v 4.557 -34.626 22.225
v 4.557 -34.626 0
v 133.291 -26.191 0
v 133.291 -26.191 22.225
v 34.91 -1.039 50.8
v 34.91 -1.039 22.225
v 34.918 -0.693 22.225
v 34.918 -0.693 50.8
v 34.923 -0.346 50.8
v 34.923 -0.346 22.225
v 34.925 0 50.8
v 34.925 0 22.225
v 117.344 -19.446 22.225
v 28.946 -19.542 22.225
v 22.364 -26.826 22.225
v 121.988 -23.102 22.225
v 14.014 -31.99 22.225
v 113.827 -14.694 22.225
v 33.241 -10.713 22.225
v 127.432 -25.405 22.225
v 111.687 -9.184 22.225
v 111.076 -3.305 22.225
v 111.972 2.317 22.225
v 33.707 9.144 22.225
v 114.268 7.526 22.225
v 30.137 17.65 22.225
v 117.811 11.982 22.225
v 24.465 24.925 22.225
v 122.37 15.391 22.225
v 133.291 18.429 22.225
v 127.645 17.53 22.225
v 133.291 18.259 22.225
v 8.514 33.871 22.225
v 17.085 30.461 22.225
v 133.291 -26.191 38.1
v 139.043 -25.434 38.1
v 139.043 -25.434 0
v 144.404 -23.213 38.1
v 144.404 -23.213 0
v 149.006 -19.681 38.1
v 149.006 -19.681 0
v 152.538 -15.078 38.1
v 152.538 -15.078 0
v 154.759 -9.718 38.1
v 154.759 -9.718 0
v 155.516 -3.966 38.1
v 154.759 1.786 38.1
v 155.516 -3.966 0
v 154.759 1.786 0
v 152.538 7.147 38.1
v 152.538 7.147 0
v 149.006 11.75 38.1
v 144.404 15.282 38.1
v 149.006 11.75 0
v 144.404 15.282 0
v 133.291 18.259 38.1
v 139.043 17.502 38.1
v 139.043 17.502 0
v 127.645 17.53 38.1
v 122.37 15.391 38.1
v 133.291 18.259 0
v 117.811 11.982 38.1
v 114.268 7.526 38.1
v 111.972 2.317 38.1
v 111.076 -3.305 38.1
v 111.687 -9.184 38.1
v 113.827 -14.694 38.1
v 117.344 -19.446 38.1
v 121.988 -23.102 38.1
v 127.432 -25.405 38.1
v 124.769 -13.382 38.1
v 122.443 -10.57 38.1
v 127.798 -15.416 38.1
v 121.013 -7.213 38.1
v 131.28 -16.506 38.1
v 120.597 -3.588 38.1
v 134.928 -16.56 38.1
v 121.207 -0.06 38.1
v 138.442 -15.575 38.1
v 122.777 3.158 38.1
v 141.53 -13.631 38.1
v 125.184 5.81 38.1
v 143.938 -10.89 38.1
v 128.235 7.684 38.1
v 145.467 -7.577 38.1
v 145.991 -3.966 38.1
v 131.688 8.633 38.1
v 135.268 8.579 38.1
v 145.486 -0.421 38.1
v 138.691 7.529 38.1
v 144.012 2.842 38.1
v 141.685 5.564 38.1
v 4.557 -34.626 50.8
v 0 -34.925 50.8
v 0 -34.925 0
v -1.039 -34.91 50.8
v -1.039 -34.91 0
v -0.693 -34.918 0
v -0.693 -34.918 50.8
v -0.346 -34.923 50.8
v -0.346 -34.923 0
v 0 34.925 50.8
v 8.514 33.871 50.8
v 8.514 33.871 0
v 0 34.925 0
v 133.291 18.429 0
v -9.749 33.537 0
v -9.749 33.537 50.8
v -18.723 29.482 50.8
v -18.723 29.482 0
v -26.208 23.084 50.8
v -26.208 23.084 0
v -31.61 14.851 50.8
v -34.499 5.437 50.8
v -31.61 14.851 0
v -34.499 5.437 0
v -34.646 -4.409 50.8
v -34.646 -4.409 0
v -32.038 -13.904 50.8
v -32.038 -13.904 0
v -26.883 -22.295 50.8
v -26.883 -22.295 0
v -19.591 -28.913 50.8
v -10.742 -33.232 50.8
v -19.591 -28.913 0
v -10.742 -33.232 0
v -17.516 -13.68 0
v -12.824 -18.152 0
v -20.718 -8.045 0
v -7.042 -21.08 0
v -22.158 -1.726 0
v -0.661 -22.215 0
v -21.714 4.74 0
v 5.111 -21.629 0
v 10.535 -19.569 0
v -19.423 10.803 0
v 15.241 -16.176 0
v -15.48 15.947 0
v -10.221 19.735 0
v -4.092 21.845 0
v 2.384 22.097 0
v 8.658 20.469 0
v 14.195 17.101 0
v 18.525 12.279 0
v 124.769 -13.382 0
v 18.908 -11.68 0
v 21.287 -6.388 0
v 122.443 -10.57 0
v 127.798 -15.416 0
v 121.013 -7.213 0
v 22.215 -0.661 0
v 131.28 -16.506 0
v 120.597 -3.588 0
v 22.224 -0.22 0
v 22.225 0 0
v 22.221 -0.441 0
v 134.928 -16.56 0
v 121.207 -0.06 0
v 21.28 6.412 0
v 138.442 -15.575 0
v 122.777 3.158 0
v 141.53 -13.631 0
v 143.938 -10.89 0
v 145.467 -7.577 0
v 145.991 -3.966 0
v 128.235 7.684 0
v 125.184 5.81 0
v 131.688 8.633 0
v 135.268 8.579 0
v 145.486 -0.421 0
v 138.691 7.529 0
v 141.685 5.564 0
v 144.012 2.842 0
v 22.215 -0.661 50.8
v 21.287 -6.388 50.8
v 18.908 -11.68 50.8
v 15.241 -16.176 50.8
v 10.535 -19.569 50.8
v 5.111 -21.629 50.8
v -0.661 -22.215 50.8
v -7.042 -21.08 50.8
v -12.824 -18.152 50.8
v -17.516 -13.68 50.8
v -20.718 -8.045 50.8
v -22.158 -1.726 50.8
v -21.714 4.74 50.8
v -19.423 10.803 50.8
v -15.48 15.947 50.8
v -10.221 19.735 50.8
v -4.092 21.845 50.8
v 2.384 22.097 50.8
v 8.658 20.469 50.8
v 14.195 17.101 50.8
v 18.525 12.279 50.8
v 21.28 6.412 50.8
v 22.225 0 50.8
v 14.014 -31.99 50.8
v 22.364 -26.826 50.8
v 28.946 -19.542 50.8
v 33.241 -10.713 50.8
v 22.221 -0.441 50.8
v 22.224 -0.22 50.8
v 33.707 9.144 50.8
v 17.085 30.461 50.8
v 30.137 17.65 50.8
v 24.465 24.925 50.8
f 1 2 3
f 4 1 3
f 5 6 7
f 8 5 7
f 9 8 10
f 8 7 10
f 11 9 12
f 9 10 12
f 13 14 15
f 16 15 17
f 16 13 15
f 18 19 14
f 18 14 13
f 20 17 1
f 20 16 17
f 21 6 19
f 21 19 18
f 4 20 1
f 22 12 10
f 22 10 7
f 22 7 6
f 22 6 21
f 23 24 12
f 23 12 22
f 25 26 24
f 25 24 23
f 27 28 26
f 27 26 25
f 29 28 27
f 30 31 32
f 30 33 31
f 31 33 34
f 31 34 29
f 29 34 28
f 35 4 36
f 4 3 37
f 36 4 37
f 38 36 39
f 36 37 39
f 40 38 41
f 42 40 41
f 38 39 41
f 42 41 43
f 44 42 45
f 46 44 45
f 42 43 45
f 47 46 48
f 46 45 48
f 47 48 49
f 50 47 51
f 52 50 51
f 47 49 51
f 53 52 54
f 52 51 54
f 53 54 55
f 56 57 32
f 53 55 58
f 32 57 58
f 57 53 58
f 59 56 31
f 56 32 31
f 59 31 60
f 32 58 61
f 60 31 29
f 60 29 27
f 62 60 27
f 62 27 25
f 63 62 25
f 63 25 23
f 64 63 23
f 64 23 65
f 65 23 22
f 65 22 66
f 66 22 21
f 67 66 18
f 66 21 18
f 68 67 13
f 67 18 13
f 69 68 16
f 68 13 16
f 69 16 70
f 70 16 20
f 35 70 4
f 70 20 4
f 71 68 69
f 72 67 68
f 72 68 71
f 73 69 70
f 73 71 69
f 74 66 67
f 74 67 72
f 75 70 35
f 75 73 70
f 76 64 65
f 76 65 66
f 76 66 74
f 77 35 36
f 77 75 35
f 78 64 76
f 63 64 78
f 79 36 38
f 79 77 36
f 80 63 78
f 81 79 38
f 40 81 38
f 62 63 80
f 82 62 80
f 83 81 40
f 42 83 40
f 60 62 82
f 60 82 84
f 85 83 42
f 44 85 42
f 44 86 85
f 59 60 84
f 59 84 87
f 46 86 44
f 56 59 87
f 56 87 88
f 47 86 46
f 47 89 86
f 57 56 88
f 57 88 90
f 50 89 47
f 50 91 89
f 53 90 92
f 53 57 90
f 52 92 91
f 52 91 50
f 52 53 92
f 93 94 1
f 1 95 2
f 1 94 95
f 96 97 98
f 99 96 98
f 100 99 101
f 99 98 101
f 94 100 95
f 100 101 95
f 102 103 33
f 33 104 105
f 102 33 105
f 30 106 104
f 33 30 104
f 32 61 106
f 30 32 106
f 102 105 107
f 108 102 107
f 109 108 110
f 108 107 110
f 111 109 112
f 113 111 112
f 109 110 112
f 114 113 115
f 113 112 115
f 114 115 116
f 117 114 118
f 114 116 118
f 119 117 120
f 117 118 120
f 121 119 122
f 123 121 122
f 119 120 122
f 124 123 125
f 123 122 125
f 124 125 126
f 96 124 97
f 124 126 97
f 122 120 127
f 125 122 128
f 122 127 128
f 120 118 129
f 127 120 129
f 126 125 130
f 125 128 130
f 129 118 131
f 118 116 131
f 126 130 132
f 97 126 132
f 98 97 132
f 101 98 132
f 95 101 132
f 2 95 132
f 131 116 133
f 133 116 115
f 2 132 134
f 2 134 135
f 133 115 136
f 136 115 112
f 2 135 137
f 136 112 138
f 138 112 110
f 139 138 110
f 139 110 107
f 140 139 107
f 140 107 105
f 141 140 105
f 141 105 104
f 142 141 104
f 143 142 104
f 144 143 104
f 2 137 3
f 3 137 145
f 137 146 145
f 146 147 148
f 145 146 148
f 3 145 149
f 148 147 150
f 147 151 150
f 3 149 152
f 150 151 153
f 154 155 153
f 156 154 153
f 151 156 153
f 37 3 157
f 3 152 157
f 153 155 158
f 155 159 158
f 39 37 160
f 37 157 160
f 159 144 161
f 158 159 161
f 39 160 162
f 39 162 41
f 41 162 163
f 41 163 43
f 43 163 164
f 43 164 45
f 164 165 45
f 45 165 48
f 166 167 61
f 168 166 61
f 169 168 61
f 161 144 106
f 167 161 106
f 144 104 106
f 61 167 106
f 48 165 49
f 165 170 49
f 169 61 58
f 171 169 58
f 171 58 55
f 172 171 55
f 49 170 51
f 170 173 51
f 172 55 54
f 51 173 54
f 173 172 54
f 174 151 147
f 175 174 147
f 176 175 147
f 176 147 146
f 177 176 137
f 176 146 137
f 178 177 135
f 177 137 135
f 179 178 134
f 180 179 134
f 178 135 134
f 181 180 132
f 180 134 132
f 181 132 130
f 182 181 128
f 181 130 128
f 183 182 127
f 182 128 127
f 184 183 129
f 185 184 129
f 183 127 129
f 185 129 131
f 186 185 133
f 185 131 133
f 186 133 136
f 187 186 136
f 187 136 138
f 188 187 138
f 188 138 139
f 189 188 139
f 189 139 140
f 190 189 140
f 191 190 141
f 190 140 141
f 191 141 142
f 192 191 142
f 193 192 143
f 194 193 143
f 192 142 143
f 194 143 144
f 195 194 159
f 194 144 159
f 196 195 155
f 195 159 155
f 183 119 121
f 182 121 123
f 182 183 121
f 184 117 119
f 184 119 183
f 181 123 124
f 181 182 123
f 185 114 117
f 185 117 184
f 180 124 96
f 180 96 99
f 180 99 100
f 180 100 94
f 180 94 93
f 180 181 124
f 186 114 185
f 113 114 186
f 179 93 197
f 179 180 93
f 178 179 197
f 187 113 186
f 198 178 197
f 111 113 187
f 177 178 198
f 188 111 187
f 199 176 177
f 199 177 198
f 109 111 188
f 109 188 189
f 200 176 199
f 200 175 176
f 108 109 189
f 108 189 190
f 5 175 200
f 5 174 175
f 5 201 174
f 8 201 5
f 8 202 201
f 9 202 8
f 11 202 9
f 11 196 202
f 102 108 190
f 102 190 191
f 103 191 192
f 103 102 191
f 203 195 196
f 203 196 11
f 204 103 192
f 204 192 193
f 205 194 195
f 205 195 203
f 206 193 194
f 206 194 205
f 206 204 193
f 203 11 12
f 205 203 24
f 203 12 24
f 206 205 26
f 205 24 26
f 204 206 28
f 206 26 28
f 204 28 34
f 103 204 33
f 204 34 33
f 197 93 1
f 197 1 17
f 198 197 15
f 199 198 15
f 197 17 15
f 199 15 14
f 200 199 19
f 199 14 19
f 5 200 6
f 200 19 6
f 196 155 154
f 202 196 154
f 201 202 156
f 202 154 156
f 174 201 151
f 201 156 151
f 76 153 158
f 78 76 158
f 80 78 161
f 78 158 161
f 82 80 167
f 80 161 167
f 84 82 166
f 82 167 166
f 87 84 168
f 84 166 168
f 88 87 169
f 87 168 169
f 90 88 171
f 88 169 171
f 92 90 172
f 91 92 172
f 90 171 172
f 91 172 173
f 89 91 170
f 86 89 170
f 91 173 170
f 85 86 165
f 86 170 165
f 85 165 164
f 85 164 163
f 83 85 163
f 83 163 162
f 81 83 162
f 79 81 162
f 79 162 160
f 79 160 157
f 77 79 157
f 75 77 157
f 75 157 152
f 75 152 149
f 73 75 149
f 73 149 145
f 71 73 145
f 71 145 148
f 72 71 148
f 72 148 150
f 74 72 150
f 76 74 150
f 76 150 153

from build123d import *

# Parameters (mm, degrees)
F1_DEPTH = 22.225
F2_DEPTH = 50.8
F3_DEPTH = 38.1


with BuildPart() as f1:
    # F0 (on Top) → F1 (new body)
    with BuildSketch(Plane.XY):
        with BuildLine():
            ThreePointArc((4.5574981074, -34.6263604209), (25.9122606637, -23.4160281067), (34.9095515761, -1.0386692217))
            Line((34.9095515761, -1.0386692217), (22.2151691848, -0.6609713229))
            ThreePointArc((22.2151691848, -0.6609713229), (15.2411194712, -16.1758740804), (-0.6609713229, -22.2151691848))
            Line((-0.6609713229, -22.2151691848), (-1.0386692217, -34.9095515761))
            ThreePointArc((-1.0386692217, -34.9095515761), (-0.5193920499, -34.9211376805), (0, -34.925))
            Line((0, -34.925), (4.5574981074, -34.6263604209))
        make_face()
        with BuildLine():
            ThreePointArc((34.9095515761, -1.0386692217), (34.9211376805, -0.5193920499), (34.925, 0))
            ThreePointArc((34.925, 0), (27.5419497881, 21.4754889786), (8.514312706, 33.871257788))
            Line((8.514312706, 33.871257788), (0, 34.925))
            ThreePointArc((0, 34.925), (-34.9211376805, 0.5193920499), (-1.0386692217, -34.9095515761))
            Line((-1.0386692217, -34.9095515761), (-0.6609713229, -22.2151691848))
            ThreePointArc((-0.6609713229, -22.2151691848), (-15.4799957582, 15.9474247553), (22.225, 0))
            ThreePointArc((22.225, 0), (22.2225421603, -0.3305222136), (22.2151691848, -0.6609713229))
            Line((22.2151691848, -0.6609713229), (34.9095515761, -1.0386692217))
        make_face()
        with BuildLine():
            Line((111.0758459241, -3.3048566146), (34.9095515761, -1.0386692217))
            ThreePointArc((34.9095515761, -1.0386692217), (25.9122606637, -23.4160281067), (4.5574981074, -34.6263604209))
            Line((4.5574981074, -34.6263604209), (133.2910151089, -26.1908279375))
            ThreePointArc((133.2910151089, -26.1908279375), (117.3435903536, -19.4458236957), (111.0758459241, -3.3048566146))
        make_face()
        with BuildLine():
            ThreePointArc((8.514312706, 33.871257788), (27.5419497881, 21.4754889786), (34.925, 0))
            ThreePointArc((34.925, 0), (34.9211376805, -0.5193920499), (34.9095515761, -1.0386692217))
            Line((34.9095515761, -1.0386692217), (111.0758459241, -3.3048566146))
            ThreePointArc((111.0758459241, -3.3048566146), (117.8110193507, 11.9815968178), (133.2910151089, 18.2591720625))
            Line((133.2910151089, 18.2591720625), (133.2910151089, 18.4287337781))
            Line((133.2910151089, 18.4287337781), (8.514312706, 33.871257788))
        make_face()
        with BuildLine():
            ThreePointArc((133.2910151089, 18.2591720625), (117.8110193507, 11.9815968178), (111.0758459241, -3.3048566146))
            ThreePointArc((111.0758459241, -3.3048566146), (117.3435903536, -19.4458236957), (133.2910151089, -26.1908279375))
            ThreePointArc((133.2910151089, -26.1908279375), (149.0064633208, -19.6812761494), (155.5160151089, -3.9658279375))
            ThreePointArc((155.5160151089, -3.9658279375), (149.0064633208, 11.7496202744), (133.2910151089, 18.2591720625))
        make_face()
        with BuildLine():
            ThreePointArc((145.9910151089, -3.9658279375), (133.1021452726, -16.6644234577), (120.5966327176, -3.5881300387))
            ThreePointArc((120.5966327176, -3.5881300387), (133.4798849453, 8.7327675827), (145.9910151089, -3.9658279375))
        make_face(mode=Mode.SUBTRACT)
    extrude(amount=F1_DEPTH)

    # F0 (on Top) → F2 (join)
    with BuildSketch(Plane.XY):
        with BuildLine():
            ThreePointArc((4.5574981074, -34.6263604209), (25.9122606637, -23.4160281067), (34.9095515761, -1.0386692217))
            Line((34.9095515761, -1.0386692217), (22.2151691848, -0.6609713229))
            ThreePointArc((22.2151691848, -0.6609713229), (15.2411194712, -16.1758740804), (-0.6609713229, -22.2151691848))
            Line((-0.6609713229, -22.2151691848), (-1.0386692217, -34.9095515761))
            ThreePointArc((-1.0386692217, -34.9095515761), (-0.5193920499, -34.9211376805), (0, -34.925))
            Line((0, -34.925), (4.5574981074, -34.6263604209))
        make_face()
        with BuildLine():
            ThreePointArc((34.9095515761, -1.0386692217), (34.9211376805, -0.5193920499), (34.925, 0))
            ThreePointArc((34.925, 0), (27.5419497881, 21.4754889786), (8.514312706, 33.871257788))
            Line((8.514312706, 33.871257788), (0, 34.925))
            ThreePointArc((0, 34.925), (-34.9211376805, 0.5193920499), (-1.0386692217, -34.9095515761))
            Line((-1.0386692217, -34.9095515761), (-0.6609713229, -22.2151691848))
            ThreePointArc((-0.6609713229, -22.2151691848), (-15.4799957582, 15.9474247553), (22.225, 0))
            ThreePointArc((22.225, 0), (22.2225421603, -0.3305222136), (22.2151691848, -0.6609713229))
            Line((22.2151691848, -0.6609713229), (34.9095515761, -1.0386692217))
        make_face()
    extrude(amount=F2_DEPTH)

    # F0 (on Top) → F3 (join)
    with BuildSketch(Plane.XY):
        with BuildLine():
            ThreePointArc((133.2910151089, 18.2591720625), (117.8110193507, 11.9815968178), (111.0758459241, -3.3048566146))
            ThreePointArc((111.0758459241, -3.3048566146), (117.3435903536, -19.4458236957), (133.2910151089, -26.1908279375))
            ThreePointArc((133.2910151089, -26.1908279375), (149.0064633208, -19.6812761494), (155.5160151089, -3.9658279375))
            ThreePointArc((155.5160151089, -3.9658279375), (149.0064633208, 11.7496202744), (133.2910151089, 18.2591720625))
        make_face()
        with BuildLine():
            ThreePointArc((145.9910151089, -3.9658279375), (133.1021452726, -16.6644234577), (120.5966327176, -3.5881300387))
            ThreePointArc((120.5966327176, -3.5881300387), (133.4798849453, 8.7327675827), (145.9910151089, -3.9658279375))
        make_face(mode=Mode.SUBTRACT)
    extrude(amount=F3_DEPTH)


solid = f1.part
